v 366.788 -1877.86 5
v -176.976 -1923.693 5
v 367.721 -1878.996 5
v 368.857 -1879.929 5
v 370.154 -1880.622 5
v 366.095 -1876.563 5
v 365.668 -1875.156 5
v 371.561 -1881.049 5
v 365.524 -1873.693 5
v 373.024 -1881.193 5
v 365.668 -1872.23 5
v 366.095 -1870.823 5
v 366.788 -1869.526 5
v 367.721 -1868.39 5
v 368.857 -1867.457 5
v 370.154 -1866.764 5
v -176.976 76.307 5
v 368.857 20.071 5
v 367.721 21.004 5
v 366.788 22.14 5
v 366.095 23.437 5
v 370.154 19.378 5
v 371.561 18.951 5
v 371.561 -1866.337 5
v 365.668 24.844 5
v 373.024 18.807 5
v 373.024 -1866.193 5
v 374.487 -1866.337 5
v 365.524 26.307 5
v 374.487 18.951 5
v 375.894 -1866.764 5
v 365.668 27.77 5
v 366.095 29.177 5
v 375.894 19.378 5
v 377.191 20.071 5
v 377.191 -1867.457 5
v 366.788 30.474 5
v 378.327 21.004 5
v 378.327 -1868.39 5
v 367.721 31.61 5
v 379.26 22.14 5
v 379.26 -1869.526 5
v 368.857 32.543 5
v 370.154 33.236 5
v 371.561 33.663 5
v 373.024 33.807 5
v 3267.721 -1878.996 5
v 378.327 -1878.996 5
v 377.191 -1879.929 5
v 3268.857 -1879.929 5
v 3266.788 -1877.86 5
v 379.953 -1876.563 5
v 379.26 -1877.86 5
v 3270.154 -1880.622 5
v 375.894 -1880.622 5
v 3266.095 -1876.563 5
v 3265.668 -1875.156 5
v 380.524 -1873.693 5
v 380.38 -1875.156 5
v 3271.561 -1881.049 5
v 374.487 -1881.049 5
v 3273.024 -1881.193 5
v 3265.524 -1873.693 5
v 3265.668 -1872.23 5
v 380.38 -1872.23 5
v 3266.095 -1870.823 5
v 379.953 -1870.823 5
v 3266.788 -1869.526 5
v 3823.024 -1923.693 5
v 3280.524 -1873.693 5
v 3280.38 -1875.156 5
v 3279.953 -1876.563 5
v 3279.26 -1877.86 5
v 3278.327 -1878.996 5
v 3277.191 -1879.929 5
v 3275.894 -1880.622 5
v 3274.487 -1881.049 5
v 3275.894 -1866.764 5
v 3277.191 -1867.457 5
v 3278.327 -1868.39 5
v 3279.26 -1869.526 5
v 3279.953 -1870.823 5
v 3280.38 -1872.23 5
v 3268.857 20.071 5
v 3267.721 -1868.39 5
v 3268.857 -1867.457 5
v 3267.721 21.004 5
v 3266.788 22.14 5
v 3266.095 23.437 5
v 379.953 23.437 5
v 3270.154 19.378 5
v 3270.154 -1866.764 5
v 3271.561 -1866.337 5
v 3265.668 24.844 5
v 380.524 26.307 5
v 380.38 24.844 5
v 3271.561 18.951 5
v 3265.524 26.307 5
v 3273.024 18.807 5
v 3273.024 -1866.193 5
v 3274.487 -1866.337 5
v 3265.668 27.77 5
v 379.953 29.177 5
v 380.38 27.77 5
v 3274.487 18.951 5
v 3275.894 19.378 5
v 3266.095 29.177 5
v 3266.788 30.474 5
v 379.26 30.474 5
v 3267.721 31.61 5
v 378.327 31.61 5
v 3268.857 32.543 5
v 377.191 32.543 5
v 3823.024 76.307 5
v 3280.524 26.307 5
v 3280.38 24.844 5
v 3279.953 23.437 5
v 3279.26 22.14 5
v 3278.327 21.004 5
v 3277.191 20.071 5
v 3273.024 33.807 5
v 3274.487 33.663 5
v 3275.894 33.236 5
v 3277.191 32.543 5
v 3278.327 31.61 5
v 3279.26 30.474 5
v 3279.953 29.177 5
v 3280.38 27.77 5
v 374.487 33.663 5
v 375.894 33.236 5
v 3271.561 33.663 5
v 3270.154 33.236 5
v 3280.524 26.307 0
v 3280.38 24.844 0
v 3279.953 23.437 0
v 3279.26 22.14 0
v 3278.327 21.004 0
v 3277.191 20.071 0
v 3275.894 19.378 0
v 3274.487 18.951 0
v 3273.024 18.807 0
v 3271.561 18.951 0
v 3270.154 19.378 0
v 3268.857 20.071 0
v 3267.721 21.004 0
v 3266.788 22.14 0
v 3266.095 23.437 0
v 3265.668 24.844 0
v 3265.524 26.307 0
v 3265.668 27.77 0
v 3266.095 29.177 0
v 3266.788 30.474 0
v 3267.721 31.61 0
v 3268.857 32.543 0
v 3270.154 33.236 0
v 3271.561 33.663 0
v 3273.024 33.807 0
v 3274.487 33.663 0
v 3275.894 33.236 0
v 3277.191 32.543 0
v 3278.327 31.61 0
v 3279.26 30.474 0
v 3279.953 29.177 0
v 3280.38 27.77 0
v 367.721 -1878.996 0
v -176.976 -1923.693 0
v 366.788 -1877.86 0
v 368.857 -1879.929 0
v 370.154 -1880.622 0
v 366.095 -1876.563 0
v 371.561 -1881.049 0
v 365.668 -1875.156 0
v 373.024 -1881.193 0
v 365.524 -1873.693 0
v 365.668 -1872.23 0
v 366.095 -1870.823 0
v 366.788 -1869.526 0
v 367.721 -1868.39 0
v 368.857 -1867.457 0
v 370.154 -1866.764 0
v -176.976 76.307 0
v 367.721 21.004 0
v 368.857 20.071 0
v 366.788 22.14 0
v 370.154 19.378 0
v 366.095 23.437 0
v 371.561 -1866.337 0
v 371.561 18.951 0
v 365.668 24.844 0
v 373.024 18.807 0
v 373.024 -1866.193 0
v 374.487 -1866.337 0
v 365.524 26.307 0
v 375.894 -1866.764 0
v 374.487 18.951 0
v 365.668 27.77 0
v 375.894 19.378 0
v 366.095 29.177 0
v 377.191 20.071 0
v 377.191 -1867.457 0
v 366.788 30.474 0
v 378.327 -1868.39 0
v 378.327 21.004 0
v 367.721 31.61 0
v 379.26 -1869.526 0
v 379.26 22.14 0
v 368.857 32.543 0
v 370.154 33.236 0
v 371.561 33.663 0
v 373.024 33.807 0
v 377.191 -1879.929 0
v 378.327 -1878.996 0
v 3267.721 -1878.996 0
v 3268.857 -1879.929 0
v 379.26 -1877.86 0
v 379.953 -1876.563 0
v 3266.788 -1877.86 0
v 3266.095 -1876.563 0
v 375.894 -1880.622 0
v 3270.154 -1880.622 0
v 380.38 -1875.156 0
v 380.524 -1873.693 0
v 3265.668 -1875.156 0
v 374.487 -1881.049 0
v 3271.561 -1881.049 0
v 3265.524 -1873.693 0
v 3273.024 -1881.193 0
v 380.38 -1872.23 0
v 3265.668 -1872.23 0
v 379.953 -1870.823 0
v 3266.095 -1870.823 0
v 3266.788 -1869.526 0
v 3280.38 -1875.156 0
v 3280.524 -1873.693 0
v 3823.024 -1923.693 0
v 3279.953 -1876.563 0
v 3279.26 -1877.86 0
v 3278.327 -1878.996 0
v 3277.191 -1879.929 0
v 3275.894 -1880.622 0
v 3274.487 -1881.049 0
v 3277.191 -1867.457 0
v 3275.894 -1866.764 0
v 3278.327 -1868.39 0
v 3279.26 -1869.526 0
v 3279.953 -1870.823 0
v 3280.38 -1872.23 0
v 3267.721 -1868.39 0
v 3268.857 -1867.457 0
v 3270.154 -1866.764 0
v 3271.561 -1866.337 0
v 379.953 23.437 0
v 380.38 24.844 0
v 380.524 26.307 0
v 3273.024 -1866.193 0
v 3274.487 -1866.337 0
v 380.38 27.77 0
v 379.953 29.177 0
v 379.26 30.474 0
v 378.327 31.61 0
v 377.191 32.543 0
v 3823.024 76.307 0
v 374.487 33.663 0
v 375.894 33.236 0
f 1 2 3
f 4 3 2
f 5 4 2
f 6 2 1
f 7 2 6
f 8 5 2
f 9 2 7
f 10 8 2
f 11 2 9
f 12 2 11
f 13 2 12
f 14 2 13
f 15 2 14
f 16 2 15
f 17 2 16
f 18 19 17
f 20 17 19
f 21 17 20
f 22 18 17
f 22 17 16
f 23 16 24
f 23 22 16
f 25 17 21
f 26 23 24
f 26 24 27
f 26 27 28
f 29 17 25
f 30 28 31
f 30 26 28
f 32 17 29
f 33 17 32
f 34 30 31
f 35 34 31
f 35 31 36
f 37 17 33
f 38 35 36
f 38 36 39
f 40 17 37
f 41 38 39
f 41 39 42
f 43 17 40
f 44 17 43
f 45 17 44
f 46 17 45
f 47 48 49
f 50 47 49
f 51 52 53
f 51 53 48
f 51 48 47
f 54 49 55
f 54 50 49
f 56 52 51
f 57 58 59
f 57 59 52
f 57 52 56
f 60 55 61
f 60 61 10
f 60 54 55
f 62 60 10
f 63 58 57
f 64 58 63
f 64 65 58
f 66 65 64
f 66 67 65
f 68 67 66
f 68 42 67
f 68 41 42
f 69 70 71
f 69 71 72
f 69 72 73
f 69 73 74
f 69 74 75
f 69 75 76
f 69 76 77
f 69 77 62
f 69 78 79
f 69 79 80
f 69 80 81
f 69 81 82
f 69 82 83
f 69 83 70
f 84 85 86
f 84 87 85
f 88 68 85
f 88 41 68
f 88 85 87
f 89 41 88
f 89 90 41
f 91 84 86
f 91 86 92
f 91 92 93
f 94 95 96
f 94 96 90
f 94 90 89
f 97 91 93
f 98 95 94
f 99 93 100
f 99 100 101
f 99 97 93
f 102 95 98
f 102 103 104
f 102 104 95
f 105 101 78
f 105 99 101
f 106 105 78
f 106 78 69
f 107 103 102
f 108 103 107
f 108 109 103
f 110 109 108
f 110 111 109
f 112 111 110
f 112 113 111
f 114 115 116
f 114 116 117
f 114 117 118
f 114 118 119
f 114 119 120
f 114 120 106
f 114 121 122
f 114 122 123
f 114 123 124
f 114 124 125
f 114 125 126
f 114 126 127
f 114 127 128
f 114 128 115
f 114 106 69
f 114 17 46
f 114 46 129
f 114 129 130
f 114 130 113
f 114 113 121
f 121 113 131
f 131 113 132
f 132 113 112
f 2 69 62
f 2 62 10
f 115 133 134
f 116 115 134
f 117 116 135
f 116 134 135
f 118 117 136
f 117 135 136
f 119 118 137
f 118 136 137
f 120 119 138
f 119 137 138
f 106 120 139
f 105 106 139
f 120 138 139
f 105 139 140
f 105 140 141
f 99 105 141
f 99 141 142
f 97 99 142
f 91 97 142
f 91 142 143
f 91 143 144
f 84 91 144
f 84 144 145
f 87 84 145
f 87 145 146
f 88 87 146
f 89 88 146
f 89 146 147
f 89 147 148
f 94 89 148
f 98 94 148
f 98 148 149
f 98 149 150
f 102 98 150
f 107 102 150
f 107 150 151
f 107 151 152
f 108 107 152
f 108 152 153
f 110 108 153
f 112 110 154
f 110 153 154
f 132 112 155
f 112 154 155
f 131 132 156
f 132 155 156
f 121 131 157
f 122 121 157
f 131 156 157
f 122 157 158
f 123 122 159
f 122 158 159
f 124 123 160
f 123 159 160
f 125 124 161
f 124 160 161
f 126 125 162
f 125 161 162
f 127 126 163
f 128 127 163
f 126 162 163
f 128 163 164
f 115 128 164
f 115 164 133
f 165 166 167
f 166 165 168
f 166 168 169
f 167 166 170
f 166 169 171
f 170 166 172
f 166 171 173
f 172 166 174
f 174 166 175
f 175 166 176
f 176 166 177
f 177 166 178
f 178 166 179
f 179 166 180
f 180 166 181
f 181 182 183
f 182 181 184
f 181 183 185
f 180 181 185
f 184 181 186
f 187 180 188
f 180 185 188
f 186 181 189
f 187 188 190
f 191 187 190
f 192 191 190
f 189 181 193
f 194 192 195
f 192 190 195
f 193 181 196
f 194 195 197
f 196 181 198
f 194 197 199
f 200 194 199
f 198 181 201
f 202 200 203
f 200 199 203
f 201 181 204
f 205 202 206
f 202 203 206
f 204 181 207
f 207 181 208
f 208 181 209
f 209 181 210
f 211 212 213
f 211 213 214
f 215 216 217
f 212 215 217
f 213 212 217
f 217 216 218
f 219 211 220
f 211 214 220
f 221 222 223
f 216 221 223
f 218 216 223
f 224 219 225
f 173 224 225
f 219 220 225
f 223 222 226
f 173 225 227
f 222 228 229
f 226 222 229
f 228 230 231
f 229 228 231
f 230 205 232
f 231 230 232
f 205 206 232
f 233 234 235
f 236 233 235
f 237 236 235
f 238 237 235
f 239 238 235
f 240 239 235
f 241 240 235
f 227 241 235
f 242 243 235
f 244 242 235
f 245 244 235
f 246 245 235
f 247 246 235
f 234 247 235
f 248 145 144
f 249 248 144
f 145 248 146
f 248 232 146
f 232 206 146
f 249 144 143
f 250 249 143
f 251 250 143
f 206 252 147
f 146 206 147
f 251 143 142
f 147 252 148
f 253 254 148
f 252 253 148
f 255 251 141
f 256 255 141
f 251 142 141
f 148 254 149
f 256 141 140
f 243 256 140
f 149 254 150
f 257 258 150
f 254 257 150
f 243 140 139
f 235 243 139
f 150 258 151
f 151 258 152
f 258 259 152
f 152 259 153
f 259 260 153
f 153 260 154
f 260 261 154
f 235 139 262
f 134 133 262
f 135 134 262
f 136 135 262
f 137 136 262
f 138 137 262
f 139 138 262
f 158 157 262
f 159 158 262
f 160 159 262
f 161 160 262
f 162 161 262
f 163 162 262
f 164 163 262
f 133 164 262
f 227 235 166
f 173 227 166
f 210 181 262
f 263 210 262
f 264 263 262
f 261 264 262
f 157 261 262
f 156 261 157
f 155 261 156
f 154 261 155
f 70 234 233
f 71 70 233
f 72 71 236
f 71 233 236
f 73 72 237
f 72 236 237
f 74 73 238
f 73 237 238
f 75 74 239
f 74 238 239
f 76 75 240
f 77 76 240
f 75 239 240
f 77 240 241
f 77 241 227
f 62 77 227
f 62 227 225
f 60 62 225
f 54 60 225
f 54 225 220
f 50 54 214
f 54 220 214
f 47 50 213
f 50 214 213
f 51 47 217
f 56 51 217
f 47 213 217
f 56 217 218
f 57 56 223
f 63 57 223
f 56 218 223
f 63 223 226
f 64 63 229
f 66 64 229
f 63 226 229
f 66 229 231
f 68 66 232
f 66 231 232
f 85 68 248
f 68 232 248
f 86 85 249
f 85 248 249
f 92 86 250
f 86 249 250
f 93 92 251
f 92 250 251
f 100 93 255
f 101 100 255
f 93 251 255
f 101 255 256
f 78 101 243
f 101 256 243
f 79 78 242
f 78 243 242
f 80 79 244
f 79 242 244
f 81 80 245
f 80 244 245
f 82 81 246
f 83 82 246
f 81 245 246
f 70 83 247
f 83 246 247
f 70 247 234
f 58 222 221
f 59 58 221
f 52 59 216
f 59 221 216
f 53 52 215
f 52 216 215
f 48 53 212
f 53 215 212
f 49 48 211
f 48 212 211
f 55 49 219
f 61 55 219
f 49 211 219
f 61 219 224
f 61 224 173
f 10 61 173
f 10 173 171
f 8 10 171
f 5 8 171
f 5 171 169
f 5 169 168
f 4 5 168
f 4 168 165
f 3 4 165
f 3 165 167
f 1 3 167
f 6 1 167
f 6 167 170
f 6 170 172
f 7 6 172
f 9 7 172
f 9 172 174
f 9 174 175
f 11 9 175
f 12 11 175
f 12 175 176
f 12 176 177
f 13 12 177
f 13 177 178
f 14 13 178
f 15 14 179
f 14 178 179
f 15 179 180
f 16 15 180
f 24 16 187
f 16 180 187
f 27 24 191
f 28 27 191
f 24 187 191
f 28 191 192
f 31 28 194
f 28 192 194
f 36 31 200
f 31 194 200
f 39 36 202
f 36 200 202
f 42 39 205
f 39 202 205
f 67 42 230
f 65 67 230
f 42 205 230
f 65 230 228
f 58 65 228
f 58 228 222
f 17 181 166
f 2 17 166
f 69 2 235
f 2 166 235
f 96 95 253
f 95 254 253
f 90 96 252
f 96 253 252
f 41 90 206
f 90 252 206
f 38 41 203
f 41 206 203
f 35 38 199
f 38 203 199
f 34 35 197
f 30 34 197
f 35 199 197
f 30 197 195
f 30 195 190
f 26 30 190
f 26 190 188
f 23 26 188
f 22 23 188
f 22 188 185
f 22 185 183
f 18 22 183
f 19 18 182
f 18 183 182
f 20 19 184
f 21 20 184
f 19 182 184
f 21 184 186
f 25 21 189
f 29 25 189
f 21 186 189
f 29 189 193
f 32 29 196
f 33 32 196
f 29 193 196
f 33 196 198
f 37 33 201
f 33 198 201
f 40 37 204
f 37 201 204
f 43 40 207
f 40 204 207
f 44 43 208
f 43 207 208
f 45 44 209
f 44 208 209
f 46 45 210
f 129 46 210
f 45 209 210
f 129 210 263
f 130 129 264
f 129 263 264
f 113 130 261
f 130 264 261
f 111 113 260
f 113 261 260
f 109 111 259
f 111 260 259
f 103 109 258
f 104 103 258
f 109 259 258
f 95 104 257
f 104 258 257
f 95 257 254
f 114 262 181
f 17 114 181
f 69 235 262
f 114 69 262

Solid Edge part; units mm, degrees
sketch "Sketch1" plane through (0, 0, 0) normal (0, 0, 1) x (1, 0, 0)
  line L0 (-176.976, -1923.6929) -> (3823.024, -1923.6929)
  line L1 (3823.024, -1923.6929) -> (3823.024, 76.3071)
  line L2 (3823.024, 76.3071) -> (-176.976, 76.3071)
  line L3 (-176.976, 76.3071) -> (-176.976, -1923.6929)
  dimension "D1" = 2000
  dimension "D2" = 4000
extrude "Protrusion1" add sketch "Sketch1" along normal blind 5
extrude "ExtrudedProtrusion_3" [suppressed]
sketch "Sketch2" plane through (1823.024, -923.6929, 0) normal (0, 0, -1) x (1, 0, 0)
  circle A0 centre (1450, 950) radius 7.5
  circle A1 centre (1450, -950) radius 7.5
  circle A2 centre (-1450, -950) radius 7.5
  circle A3 centre (-1450, 950) radius 7.5
  dimension "D1" = 1900
  dimension "D2" = 2900
  dimension "D3" = 15
  dimension "D4" = 15
  dimension "D5" = 15
  dimension "D6" = 15
  dimension "D7" = 950
  dimension "D8" = 1450
extrude "Cutout1" cut sketch "Sketch2" against normal through all
properties material "Aluminum, 6061-T6"
